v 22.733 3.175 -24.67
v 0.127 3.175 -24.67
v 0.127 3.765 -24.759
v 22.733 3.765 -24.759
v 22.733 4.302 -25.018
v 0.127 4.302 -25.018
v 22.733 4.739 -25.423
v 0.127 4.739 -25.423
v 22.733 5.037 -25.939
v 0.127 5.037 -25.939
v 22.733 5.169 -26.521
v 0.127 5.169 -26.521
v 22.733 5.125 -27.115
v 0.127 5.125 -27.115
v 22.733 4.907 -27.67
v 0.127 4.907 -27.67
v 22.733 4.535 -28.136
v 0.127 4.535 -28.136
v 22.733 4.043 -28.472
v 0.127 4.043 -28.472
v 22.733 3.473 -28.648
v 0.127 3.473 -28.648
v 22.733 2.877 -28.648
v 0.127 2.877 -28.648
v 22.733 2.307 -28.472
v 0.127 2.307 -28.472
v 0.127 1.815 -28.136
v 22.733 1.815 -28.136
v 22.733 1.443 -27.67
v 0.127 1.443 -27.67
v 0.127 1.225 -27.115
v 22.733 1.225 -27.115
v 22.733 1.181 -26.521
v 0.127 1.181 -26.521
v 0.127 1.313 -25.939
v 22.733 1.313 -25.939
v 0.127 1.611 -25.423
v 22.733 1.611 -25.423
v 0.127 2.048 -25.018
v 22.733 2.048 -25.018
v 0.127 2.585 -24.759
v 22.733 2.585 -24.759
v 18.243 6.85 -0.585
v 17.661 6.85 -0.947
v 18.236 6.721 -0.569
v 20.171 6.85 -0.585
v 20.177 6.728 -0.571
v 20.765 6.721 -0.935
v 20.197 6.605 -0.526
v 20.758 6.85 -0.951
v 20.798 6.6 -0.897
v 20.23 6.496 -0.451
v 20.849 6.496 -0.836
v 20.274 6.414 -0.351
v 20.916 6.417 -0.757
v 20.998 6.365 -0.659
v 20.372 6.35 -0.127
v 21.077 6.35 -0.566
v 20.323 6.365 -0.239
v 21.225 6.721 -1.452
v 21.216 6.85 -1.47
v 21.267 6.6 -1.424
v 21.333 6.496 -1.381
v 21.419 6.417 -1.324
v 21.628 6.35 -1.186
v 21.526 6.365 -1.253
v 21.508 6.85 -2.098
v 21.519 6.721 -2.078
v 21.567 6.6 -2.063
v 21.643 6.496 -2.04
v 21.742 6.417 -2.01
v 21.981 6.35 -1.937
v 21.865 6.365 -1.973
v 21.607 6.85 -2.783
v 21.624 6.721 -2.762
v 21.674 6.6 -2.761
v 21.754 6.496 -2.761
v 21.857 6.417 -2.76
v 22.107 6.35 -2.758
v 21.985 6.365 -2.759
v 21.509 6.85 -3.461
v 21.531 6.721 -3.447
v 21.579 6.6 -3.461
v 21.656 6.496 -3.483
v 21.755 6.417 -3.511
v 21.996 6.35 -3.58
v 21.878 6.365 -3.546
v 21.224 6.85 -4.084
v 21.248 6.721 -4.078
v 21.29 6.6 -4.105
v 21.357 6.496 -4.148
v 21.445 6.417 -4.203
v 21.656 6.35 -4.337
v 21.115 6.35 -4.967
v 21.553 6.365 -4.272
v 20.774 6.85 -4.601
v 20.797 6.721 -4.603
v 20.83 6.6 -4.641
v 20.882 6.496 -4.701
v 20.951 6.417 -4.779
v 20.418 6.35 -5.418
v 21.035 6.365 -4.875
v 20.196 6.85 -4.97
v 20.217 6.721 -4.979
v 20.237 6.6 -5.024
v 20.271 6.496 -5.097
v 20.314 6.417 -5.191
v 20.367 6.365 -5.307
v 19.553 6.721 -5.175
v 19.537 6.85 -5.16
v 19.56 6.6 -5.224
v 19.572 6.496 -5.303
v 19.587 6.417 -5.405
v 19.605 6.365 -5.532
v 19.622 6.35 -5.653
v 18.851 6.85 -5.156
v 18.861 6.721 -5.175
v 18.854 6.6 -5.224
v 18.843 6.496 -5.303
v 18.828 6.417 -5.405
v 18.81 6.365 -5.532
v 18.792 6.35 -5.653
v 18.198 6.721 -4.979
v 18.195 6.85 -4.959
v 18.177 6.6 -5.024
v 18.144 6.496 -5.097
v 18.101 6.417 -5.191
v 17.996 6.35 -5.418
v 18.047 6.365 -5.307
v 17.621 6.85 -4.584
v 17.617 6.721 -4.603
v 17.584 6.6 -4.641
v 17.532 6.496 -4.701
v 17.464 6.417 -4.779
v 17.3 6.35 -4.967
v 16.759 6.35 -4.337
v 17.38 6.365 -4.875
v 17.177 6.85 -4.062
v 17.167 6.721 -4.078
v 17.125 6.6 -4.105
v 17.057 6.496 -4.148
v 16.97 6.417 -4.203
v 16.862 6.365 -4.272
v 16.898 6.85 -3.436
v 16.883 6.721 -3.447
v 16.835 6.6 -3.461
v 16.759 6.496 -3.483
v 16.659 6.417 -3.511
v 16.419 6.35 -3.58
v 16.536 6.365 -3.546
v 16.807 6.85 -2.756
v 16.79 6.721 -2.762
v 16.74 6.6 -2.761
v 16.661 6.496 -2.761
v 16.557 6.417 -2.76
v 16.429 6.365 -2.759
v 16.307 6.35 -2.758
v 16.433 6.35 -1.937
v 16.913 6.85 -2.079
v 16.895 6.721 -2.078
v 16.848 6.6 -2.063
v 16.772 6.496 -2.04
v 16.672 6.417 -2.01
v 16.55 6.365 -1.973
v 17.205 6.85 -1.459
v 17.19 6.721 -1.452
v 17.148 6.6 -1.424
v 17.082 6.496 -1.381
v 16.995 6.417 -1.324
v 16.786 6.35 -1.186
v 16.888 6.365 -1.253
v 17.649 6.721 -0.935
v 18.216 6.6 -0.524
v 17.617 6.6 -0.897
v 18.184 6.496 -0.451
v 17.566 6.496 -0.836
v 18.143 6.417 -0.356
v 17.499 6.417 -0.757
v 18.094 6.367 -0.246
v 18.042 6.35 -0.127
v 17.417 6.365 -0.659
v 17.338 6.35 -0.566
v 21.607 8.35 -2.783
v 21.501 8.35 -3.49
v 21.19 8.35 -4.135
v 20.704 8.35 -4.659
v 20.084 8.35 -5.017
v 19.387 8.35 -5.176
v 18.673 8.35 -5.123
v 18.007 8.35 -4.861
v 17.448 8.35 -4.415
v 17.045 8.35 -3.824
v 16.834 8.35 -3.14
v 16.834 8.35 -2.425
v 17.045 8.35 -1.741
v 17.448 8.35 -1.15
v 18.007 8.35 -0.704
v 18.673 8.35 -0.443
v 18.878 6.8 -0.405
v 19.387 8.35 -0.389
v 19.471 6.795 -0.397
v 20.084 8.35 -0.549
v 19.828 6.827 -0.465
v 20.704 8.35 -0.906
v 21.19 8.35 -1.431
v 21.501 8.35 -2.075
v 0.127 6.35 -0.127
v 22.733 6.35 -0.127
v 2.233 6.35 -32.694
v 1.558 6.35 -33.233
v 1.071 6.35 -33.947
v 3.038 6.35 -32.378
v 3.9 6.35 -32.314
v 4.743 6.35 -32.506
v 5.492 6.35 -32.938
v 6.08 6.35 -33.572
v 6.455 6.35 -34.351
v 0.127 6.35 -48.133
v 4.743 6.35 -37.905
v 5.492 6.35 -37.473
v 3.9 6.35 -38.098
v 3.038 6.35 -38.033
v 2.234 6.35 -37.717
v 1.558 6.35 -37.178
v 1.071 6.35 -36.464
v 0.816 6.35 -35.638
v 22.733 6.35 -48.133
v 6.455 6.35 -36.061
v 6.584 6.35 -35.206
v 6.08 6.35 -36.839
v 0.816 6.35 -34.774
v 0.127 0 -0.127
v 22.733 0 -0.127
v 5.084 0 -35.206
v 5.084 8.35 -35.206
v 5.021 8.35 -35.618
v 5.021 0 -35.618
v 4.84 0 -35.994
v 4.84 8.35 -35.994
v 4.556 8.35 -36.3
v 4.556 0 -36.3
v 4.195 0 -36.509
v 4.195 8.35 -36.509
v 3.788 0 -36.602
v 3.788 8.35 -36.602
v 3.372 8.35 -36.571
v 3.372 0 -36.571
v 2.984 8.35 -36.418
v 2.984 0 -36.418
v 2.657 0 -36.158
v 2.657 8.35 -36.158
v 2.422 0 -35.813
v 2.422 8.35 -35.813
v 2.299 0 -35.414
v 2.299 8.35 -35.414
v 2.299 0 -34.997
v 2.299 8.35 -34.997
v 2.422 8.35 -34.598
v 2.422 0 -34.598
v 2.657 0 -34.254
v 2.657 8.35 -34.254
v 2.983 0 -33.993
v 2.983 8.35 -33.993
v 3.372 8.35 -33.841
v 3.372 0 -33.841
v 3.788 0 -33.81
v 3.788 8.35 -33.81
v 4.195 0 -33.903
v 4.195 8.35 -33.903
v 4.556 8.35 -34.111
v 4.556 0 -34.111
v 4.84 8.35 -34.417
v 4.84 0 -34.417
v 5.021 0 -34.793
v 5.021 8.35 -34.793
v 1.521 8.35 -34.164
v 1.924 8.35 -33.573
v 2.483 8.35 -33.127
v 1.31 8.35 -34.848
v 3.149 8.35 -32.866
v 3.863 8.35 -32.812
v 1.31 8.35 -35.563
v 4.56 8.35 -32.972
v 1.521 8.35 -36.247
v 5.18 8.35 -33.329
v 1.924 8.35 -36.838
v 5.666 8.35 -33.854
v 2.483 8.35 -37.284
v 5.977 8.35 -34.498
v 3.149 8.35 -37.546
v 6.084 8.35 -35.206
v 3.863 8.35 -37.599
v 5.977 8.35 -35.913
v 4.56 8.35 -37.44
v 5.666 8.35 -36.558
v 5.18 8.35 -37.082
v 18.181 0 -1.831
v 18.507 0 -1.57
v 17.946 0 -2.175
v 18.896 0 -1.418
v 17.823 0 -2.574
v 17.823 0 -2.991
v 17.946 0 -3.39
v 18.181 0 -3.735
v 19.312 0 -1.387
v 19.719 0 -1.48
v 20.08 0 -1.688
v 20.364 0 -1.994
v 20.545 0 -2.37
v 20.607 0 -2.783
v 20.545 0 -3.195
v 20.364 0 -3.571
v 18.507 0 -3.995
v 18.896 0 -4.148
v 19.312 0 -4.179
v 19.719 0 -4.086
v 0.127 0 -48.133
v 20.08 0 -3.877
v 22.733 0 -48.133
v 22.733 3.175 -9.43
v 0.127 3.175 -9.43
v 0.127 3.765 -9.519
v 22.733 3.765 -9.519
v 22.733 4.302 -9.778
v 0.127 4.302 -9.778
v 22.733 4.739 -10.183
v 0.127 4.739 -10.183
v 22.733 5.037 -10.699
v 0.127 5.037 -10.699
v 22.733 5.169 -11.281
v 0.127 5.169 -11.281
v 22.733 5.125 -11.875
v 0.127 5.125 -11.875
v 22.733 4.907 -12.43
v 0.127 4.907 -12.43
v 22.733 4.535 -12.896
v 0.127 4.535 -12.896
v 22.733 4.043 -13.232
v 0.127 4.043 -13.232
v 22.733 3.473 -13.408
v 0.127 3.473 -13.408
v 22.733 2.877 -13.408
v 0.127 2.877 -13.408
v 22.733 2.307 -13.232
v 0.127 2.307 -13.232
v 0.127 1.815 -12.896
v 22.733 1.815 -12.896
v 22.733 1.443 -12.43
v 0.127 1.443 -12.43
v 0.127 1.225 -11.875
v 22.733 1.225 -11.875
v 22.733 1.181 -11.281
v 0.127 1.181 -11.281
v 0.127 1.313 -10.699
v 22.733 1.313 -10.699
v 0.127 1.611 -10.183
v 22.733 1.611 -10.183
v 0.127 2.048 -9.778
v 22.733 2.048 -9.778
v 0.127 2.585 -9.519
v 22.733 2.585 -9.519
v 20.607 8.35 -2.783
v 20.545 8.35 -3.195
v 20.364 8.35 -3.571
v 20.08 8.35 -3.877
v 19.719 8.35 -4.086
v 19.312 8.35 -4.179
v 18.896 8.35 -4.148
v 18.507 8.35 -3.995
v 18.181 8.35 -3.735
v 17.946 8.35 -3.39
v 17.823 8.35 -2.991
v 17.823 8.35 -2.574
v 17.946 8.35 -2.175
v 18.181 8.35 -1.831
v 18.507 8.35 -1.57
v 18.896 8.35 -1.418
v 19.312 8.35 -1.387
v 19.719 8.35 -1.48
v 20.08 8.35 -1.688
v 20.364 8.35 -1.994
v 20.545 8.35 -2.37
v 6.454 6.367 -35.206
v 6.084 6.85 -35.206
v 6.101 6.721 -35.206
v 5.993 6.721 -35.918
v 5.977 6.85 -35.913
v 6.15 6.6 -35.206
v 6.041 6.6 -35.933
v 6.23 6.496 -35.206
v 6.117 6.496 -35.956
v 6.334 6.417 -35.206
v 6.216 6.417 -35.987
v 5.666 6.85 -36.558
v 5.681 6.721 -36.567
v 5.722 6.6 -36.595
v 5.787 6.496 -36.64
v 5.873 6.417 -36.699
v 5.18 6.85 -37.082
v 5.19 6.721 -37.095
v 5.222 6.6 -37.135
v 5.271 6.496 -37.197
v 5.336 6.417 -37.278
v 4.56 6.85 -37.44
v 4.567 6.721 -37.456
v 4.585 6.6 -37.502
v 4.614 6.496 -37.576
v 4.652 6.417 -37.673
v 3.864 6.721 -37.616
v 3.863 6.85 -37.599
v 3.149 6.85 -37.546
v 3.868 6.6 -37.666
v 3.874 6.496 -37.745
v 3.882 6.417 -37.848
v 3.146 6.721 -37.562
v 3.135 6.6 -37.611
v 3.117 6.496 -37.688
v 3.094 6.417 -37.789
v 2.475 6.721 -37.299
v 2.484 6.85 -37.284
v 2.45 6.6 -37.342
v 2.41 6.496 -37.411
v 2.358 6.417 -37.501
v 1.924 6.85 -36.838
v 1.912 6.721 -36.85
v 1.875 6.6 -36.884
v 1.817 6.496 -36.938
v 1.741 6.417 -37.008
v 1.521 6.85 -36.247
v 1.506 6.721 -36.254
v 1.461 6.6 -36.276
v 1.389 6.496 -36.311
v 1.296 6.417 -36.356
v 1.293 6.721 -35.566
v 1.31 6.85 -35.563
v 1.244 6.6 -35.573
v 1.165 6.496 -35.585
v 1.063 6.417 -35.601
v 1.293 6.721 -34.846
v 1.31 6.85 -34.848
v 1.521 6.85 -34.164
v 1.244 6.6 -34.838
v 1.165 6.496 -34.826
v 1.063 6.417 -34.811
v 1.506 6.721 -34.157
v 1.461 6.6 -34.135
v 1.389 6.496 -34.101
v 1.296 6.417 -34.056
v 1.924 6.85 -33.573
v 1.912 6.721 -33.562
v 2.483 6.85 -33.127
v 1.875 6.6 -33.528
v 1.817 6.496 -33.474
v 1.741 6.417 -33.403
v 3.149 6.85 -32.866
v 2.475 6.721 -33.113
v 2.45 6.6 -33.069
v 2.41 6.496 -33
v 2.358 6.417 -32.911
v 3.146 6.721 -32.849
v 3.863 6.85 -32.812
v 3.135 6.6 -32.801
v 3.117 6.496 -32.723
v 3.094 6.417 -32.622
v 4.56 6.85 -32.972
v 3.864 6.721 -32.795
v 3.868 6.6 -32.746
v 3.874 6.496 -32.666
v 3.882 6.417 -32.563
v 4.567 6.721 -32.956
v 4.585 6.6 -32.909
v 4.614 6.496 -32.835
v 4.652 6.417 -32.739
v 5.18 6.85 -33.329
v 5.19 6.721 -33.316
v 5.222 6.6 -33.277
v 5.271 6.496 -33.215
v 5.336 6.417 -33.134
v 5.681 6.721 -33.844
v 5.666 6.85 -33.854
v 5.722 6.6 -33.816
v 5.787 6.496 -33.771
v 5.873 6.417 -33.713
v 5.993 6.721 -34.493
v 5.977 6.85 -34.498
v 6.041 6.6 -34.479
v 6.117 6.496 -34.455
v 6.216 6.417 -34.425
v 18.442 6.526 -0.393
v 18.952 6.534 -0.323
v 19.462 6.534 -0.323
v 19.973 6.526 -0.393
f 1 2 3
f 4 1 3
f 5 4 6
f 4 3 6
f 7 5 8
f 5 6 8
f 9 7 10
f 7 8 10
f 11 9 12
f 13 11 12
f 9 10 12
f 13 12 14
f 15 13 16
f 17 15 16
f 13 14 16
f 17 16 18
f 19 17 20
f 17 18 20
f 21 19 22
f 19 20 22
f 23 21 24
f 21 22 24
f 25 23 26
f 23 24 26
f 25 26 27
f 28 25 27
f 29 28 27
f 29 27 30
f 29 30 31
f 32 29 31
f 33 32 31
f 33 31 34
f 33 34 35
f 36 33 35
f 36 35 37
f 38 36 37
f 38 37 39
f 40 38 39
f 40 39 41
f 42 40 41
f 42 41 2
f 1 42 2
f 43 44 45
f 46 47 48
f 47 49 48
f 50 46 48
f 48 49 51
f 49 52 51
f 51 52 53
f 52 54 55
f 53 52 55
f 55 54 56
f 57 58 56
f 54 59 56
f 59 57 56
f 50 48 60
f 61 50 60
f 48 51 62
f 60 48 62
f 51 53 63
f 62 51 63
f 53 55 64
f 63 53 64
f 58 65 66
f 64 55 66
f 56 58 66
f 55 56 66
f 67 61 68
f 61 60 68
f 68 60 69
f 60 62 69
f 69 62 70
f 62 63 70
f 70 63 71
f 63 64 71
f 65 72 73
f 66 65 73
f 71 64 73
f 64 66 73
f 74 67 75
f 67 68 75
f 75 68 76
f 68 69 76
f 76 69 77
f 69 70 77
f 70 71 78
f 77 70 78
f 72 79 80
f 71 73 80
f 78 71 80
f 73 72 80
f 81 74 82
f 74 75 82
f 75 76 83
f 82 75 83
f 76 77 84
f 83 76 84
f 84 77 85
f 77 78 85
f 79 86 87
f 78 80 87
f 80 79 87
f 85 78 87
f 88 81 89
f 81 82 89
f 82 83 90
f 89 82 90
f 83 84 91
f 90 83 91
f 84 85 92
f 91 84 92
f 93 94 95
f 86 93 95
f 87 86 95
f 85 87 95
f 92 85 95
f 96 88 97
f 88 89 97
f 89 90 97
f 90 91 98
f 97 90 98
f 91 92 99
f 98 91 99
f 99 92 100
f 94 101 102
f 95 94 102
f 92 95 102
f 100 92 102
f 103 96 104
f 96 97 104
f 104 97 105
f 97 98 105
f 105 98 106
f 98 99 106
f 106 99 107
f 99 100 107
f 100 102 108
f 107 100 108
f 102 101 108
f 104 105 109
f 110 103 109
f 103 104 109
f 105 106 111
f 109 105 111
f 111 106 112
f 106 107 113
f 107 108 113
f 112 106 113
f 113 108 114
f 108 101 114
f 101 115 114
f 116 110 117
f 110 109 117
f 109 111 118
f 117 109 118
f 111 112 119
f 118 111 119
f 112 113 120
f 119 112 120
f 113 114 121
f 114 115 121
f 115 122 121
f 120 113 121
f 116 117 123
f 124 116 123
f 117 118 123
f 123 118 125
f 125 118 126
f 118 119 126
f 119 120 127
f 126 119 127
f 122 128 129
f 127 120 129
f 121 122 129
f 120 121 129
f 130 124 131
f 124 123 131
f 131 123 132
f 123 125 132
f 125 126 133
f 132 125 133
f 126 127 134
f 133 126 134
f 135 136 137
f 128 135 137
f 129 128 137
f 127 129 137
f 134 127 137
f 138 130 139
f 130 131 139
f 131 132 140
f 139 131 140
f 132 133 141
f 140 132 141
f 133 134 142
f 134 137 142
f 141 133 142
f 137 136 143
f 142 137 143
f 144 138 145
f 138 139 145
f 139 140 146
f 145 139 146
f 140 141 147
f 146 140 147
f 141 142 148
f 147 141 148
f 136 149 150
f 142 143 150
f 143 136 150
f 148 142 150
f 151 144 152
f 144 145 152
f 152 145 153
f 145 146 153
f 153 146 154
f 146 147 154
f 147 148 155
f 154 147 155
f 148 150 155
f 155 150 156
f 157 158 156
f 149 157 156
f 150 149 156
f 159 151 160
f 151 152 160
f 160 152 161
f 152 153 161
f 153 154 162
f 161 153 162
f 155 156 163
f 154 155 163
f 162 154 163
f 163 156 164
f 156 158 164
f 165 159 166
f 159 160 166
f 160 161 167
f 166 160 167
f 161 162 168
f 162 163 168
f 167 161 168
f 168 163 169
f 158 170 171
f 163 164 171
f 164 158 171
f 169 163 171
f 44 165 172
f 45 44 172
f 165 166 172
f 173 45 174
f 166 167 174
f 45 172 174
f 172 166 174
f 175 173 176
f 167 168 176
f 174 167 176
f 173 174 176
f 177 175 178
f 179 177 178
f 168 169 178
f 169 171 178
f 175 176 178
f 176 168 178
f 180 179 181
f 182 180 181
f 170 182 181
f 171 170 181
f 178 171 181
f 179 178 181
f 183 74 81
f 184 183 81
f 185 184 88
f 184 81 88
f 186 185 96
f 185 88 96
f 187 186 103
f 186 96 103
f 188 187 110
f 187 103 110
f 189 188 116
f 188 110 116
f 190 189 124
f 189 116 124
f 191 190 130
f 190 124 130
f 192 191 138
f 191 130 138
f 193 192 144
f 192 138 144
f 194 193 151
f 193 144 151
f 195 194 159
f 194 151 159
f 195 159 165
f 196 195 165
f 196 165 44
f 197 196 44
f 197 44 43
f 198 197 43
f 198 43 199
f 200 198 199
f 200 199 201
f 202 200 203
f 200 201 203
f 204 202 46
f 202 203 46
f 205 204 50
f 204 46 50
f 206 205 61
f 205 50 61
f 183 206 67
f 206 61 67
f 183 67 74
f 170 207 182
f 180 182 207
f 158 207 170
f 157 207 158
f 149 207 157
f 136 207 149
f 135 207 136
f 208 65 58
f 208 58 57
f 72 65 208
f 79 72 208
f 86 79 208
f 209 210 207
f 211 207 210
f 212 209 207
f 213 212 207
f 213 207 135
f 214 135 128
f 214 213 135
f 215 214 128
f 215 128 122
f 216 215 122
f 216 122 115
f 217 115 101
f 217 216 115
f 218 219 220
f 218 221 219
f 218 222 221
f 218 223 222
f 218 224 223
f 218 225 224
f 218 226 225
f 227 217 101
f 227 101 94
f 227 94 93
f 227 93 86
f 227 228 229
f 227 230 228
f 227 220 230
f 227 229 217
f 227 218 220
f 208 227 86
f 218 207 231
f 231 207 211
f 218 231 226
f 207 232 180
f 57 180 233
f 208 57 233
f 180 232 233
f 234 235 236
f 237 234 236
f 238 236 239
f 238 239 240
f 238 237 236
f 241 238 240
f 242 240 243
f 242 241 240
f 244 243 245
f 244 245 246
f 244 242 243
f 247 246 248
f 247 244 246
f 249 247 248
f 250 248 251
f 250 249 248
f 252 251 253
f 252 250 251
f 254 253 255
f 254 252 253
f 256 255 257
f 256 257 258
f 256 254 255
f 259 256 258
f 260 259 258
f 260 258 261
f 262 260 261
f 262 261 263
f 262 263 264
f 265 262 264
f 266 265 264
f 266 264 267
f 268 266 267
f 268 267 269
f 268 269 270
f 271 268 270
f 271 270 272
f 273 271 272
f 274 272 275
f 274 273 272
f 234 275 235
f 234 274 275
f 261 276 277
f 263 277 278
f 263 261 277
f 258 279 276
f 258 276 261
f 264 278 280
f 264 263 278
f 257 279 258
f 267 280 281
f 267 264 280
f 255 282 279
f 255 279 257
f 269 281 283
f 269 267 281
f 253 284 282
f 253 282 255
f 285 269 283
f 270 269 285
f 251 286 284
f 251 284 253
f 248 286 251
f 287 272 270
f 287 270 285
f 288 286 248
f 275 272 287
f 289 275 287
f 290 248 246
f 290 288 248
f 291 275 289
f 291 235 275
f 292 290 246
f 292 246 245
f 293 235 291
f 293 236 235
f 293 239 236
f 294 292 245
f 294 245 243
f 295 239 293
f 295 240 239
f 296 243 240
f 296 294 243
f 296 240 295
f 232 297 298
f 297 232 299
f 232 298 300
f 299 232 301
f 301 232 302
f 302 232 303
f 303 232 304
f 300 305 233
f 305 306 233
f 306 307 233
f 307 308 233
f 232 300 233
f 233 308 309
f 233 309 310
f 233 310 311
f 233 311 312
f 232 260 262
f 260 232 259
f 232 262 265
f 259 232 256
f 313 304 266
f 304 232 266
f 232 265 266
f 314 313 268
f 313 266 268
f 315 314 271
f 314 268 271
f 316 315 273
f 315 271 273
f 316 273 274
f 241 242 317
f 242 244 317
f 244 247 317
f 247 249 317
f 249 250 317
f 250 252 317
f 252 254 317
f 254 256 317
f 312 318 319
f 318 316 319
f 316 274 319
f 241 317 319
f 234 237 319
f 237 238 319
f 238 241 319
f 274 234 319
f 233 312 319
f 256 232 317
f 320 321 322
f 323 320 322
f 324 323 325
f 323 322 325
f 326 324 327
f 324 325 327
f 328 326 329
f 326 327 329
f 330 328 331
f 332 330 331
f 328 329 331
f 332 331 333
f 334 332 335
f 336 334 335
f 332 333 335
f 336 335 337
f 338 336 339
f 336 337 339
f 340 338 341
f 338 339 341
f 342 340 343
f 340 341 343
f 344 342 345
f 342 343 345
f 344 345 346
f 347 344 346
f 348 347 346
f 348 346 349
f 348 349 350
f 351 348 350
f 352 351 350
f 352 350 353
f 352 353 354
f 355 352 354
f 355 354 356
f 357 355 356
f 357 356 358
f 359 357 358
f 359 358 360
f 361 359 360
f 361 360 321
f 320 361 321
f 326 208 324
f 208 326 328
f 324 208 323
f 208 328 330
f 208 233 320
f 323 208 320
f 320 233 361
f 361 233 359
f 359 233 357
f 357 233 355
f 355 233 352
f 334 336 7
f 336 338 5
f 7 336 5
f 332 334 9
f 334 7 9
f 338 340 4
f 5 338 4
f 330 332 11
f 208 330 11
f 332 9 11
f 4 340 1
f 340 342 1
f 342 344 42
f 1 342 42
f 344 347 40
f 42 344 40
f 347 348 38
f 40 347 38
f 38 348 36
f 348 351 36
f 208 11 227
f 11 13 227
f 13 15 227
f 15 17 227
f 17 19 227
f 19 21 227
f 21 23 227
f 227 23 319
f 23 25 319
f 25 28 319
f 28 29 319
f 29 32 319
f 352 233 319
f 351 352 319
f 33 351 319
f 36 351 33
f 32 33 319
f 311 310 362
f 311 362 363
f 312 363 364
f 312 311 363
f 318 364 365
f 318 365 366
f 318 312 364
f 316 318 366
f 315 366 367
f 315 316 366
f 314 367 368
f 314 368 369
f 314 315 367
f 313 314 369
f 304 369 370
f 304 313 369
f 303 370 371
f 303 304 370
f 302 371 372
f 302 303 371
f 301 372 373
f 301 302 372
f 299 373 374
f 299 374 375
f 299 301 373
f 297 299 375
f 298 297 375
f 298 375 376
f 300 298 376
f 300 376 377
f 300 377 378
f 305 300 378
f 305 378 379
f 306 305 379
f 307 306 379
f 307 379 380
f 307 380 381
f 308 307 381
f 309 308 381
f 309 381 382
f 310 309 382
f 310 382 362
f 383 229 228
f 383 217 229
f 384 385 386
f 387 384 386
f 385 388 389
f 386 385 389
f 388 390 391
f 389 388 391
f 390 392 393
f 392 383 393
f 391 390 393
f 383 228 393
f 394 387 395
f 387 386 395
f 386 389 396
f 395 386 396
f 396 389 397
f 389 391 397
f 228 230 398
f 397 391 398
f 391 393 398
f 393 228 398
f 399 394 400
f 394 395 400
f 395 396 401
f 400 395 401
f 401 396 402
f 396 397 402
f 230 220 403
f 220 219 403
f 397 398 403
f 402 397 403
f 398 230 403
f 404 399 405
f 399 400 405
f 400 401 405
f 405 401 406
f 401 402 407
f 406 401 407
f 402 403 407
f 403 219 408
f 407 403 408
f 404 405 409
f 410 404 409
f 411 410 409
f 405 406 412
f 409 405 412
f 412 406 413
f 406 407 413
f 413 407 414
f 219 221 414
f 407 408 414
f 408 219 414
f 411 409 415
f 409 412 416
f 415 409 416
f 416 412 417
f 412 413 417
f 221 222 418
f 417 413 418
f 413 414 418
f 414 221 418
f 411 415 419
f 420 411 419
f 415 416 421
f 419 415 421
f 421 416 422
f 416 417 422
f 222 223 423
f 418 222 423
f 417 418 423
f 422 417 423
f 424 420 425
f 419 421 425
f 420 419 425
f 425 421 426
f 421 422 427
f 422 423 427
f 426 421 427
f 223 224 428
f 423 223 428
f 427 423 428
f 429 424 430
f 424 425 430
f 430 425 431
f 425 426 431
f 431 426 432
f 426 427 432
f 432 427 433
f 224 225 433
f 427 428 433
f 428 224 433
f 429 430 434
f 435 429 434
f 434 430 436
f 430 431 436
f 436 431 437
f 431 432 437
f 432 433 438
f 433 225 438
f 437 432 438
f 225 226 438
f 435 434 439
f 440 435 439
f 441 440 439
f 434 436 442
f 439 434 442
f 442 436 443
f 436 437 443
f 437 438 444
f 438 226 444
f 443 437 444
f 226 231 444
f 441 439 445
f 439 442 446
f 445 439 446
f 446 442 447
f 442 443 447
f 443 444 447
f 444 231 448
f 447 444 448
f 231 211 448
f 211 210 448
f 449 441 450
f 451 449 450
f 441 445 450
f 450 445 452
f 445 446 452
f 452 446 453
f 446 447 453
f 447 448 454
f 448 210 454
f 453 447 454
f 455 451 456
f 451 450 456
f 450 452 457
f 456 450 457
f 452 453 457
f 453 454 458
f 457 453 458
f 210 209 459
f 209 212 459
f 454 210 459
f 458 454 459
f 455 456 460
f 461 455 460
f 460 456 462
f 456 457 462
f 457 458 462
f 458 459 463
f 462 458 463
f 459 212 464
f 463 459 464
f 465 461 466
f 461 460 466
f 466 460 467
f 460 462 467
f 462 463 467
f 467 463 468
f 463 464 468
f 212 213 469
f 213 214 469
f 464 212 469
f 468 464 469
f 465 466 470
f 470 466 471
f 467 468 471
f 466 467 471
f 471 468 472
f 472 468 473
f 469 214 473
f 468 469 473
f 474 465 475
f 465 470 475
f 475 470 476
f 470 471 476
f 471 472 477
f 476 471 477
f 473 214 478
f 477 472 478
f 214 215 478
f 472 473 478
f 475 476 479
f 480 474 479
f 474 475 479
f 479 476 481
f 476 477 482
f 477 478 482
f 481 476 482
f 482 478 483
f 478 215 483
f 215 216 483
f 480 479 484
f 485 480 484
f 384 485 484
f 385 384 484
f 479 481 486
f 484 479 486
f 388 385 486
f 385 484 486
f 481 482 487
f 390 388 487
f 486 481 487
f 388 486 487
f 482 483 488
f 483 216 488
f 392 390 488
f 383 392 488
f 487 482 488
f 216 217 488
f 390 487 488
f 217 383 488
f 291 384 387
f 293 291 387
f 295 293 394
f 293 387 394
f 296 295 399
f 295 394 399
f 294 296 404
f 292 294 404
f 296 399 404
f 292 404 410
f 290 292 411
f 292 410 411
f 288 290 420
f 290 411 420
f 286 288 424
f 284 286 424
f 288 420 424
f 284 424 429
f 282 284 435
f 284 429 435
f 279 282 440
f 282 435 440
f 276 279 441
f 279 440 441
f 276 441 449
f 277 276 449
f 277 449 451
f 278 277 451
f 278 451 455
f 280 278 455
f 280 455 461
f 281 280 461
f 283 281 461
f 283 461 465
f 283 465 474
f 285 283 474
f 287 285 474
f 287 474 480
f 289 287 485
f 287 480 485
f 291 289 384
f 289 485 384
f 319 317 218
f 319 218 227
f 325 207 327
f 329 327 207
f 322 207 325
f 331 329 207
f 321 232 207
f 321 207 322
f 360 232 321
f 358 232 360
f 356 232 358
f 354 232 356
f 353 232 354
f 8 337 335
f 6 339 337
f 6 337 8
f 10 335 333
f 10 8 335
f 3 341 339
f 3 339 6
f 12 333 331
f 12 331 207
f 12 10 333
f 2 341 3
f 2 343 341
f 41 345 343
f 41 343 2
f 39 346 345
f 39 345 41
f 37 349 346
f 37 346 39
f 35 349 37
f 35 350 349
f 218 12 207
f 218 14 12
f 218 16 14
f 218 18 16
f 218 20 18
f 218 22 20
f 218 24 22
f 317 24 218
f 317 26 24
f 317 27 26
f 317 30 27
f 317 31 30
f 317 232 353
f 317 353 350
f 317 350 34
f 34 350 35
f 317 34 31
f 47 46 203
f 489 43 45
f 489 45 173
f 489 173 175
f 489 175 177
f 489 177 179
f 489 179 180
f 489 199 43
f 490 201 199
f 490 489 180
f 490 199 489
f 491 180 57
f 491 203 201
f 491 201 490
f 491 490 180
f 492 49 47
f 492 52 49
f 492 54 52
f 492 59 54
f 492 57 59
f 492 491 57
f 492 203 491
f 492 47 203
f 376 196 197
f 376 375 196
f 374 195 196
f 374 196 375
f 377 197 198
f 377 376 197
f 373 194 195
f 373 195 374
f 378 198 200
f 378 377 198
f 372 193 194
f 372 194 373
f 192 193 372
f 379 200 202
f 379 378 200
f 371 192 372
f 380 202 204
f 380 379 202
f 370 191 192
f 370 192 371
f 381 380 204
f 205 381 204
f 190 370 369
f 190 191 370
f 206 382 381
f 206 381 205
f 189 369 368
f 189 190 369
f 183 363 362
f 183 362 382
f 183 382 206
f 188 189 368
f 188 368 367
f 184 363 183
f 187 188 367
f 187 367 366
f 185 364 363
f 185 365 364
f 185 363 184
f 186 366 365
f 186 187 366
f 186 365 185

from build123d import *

# Parameters (mm, degrees)
SKETCH1_W           = 22.606
SKETCH1_H           = 48.006
SKETCH1_R           = 1.4
BOSS_EXTRUDE1_DEPTH = 6.35
SKETCH2_R           = 2
CUT_EXTRUDE1_DEPTH  = 23.606
SKETCH3_R           = 2.4
SKETCH3_R_2         = 1.4
BOSS_EXTRUDE2_DEPTH = 2
FILLET1_R           = 0.5


with BuildPart() as part:
    # Sketch1 → Boss-Extrude1 (new body)
    with BuildSketch(Plane(origin=(0, 0, 0), x_dir=(1, 0, 0), z_dir=(0, 1, 0))):
        with Locations((11.43, 24.13)):
            Rectangle(SKETCH1_W, SKETCH1_H)
        with Locations((3.6835, 35.20575)):
            Circle(SKETCH1_R, mode=Mode.SUBTRACT)
        with Locations((19.2073, 2.78275)):
            Circle(SKETCH1_R, mode=Mode.SUBTRACT)
    extrude(amount=BOSS_EXTRUDE1_DEPTH)

    # Sketch2 → Cut-Extrude1 (cut, through all)
    with BuildSketch(Plane.ZY.offset(-0.127)):
        with Locations((-26.67, 3.175)):
            Circle(SKETCH2_R)
        with Locations((-11.43, 3.175)):
            Circle(SKETCH2_R)
    extrude(amount=-CUT_EXTRUDE1_DEPTH, mode=Mode.SUBTRACT)

    # Sketch3 → Boss-Extrude2 (add)
    with BuildSketch(Plane(origin=(0, 6.35, 0), x_dir=(1, 0, 0), z_dir=(0, 1, 0))):
        with Locations((3.6835, 35.20575)):
            Circle(SKETCH3_R)
        with Locations((3.6835, 35.20575)):
            Circle(SKETCH3_R_2, mode=Mode.SUBTRACT)
        with Locations((19.2073, 2.78275)):
            Circle(SKETCH3_R)
        with Locations((19.2073, 2.78275)):
            Circle(SKETCH3_R_2, mode=Mode.SUBTRACT)
    extrude(amount=BOSS_EXTRUDE2_DEPTH)

    # Fillet1
    fillet1_edges = [part.edges().sort_by_distance(p)[0] for p in [
        (1.2835, 6.35, -35.20575),
        (16.8073, 6.35, -2.78275),
    ]]
    fillet(fillet1_edges, radius=FILLET1_R)


solid = part.part
